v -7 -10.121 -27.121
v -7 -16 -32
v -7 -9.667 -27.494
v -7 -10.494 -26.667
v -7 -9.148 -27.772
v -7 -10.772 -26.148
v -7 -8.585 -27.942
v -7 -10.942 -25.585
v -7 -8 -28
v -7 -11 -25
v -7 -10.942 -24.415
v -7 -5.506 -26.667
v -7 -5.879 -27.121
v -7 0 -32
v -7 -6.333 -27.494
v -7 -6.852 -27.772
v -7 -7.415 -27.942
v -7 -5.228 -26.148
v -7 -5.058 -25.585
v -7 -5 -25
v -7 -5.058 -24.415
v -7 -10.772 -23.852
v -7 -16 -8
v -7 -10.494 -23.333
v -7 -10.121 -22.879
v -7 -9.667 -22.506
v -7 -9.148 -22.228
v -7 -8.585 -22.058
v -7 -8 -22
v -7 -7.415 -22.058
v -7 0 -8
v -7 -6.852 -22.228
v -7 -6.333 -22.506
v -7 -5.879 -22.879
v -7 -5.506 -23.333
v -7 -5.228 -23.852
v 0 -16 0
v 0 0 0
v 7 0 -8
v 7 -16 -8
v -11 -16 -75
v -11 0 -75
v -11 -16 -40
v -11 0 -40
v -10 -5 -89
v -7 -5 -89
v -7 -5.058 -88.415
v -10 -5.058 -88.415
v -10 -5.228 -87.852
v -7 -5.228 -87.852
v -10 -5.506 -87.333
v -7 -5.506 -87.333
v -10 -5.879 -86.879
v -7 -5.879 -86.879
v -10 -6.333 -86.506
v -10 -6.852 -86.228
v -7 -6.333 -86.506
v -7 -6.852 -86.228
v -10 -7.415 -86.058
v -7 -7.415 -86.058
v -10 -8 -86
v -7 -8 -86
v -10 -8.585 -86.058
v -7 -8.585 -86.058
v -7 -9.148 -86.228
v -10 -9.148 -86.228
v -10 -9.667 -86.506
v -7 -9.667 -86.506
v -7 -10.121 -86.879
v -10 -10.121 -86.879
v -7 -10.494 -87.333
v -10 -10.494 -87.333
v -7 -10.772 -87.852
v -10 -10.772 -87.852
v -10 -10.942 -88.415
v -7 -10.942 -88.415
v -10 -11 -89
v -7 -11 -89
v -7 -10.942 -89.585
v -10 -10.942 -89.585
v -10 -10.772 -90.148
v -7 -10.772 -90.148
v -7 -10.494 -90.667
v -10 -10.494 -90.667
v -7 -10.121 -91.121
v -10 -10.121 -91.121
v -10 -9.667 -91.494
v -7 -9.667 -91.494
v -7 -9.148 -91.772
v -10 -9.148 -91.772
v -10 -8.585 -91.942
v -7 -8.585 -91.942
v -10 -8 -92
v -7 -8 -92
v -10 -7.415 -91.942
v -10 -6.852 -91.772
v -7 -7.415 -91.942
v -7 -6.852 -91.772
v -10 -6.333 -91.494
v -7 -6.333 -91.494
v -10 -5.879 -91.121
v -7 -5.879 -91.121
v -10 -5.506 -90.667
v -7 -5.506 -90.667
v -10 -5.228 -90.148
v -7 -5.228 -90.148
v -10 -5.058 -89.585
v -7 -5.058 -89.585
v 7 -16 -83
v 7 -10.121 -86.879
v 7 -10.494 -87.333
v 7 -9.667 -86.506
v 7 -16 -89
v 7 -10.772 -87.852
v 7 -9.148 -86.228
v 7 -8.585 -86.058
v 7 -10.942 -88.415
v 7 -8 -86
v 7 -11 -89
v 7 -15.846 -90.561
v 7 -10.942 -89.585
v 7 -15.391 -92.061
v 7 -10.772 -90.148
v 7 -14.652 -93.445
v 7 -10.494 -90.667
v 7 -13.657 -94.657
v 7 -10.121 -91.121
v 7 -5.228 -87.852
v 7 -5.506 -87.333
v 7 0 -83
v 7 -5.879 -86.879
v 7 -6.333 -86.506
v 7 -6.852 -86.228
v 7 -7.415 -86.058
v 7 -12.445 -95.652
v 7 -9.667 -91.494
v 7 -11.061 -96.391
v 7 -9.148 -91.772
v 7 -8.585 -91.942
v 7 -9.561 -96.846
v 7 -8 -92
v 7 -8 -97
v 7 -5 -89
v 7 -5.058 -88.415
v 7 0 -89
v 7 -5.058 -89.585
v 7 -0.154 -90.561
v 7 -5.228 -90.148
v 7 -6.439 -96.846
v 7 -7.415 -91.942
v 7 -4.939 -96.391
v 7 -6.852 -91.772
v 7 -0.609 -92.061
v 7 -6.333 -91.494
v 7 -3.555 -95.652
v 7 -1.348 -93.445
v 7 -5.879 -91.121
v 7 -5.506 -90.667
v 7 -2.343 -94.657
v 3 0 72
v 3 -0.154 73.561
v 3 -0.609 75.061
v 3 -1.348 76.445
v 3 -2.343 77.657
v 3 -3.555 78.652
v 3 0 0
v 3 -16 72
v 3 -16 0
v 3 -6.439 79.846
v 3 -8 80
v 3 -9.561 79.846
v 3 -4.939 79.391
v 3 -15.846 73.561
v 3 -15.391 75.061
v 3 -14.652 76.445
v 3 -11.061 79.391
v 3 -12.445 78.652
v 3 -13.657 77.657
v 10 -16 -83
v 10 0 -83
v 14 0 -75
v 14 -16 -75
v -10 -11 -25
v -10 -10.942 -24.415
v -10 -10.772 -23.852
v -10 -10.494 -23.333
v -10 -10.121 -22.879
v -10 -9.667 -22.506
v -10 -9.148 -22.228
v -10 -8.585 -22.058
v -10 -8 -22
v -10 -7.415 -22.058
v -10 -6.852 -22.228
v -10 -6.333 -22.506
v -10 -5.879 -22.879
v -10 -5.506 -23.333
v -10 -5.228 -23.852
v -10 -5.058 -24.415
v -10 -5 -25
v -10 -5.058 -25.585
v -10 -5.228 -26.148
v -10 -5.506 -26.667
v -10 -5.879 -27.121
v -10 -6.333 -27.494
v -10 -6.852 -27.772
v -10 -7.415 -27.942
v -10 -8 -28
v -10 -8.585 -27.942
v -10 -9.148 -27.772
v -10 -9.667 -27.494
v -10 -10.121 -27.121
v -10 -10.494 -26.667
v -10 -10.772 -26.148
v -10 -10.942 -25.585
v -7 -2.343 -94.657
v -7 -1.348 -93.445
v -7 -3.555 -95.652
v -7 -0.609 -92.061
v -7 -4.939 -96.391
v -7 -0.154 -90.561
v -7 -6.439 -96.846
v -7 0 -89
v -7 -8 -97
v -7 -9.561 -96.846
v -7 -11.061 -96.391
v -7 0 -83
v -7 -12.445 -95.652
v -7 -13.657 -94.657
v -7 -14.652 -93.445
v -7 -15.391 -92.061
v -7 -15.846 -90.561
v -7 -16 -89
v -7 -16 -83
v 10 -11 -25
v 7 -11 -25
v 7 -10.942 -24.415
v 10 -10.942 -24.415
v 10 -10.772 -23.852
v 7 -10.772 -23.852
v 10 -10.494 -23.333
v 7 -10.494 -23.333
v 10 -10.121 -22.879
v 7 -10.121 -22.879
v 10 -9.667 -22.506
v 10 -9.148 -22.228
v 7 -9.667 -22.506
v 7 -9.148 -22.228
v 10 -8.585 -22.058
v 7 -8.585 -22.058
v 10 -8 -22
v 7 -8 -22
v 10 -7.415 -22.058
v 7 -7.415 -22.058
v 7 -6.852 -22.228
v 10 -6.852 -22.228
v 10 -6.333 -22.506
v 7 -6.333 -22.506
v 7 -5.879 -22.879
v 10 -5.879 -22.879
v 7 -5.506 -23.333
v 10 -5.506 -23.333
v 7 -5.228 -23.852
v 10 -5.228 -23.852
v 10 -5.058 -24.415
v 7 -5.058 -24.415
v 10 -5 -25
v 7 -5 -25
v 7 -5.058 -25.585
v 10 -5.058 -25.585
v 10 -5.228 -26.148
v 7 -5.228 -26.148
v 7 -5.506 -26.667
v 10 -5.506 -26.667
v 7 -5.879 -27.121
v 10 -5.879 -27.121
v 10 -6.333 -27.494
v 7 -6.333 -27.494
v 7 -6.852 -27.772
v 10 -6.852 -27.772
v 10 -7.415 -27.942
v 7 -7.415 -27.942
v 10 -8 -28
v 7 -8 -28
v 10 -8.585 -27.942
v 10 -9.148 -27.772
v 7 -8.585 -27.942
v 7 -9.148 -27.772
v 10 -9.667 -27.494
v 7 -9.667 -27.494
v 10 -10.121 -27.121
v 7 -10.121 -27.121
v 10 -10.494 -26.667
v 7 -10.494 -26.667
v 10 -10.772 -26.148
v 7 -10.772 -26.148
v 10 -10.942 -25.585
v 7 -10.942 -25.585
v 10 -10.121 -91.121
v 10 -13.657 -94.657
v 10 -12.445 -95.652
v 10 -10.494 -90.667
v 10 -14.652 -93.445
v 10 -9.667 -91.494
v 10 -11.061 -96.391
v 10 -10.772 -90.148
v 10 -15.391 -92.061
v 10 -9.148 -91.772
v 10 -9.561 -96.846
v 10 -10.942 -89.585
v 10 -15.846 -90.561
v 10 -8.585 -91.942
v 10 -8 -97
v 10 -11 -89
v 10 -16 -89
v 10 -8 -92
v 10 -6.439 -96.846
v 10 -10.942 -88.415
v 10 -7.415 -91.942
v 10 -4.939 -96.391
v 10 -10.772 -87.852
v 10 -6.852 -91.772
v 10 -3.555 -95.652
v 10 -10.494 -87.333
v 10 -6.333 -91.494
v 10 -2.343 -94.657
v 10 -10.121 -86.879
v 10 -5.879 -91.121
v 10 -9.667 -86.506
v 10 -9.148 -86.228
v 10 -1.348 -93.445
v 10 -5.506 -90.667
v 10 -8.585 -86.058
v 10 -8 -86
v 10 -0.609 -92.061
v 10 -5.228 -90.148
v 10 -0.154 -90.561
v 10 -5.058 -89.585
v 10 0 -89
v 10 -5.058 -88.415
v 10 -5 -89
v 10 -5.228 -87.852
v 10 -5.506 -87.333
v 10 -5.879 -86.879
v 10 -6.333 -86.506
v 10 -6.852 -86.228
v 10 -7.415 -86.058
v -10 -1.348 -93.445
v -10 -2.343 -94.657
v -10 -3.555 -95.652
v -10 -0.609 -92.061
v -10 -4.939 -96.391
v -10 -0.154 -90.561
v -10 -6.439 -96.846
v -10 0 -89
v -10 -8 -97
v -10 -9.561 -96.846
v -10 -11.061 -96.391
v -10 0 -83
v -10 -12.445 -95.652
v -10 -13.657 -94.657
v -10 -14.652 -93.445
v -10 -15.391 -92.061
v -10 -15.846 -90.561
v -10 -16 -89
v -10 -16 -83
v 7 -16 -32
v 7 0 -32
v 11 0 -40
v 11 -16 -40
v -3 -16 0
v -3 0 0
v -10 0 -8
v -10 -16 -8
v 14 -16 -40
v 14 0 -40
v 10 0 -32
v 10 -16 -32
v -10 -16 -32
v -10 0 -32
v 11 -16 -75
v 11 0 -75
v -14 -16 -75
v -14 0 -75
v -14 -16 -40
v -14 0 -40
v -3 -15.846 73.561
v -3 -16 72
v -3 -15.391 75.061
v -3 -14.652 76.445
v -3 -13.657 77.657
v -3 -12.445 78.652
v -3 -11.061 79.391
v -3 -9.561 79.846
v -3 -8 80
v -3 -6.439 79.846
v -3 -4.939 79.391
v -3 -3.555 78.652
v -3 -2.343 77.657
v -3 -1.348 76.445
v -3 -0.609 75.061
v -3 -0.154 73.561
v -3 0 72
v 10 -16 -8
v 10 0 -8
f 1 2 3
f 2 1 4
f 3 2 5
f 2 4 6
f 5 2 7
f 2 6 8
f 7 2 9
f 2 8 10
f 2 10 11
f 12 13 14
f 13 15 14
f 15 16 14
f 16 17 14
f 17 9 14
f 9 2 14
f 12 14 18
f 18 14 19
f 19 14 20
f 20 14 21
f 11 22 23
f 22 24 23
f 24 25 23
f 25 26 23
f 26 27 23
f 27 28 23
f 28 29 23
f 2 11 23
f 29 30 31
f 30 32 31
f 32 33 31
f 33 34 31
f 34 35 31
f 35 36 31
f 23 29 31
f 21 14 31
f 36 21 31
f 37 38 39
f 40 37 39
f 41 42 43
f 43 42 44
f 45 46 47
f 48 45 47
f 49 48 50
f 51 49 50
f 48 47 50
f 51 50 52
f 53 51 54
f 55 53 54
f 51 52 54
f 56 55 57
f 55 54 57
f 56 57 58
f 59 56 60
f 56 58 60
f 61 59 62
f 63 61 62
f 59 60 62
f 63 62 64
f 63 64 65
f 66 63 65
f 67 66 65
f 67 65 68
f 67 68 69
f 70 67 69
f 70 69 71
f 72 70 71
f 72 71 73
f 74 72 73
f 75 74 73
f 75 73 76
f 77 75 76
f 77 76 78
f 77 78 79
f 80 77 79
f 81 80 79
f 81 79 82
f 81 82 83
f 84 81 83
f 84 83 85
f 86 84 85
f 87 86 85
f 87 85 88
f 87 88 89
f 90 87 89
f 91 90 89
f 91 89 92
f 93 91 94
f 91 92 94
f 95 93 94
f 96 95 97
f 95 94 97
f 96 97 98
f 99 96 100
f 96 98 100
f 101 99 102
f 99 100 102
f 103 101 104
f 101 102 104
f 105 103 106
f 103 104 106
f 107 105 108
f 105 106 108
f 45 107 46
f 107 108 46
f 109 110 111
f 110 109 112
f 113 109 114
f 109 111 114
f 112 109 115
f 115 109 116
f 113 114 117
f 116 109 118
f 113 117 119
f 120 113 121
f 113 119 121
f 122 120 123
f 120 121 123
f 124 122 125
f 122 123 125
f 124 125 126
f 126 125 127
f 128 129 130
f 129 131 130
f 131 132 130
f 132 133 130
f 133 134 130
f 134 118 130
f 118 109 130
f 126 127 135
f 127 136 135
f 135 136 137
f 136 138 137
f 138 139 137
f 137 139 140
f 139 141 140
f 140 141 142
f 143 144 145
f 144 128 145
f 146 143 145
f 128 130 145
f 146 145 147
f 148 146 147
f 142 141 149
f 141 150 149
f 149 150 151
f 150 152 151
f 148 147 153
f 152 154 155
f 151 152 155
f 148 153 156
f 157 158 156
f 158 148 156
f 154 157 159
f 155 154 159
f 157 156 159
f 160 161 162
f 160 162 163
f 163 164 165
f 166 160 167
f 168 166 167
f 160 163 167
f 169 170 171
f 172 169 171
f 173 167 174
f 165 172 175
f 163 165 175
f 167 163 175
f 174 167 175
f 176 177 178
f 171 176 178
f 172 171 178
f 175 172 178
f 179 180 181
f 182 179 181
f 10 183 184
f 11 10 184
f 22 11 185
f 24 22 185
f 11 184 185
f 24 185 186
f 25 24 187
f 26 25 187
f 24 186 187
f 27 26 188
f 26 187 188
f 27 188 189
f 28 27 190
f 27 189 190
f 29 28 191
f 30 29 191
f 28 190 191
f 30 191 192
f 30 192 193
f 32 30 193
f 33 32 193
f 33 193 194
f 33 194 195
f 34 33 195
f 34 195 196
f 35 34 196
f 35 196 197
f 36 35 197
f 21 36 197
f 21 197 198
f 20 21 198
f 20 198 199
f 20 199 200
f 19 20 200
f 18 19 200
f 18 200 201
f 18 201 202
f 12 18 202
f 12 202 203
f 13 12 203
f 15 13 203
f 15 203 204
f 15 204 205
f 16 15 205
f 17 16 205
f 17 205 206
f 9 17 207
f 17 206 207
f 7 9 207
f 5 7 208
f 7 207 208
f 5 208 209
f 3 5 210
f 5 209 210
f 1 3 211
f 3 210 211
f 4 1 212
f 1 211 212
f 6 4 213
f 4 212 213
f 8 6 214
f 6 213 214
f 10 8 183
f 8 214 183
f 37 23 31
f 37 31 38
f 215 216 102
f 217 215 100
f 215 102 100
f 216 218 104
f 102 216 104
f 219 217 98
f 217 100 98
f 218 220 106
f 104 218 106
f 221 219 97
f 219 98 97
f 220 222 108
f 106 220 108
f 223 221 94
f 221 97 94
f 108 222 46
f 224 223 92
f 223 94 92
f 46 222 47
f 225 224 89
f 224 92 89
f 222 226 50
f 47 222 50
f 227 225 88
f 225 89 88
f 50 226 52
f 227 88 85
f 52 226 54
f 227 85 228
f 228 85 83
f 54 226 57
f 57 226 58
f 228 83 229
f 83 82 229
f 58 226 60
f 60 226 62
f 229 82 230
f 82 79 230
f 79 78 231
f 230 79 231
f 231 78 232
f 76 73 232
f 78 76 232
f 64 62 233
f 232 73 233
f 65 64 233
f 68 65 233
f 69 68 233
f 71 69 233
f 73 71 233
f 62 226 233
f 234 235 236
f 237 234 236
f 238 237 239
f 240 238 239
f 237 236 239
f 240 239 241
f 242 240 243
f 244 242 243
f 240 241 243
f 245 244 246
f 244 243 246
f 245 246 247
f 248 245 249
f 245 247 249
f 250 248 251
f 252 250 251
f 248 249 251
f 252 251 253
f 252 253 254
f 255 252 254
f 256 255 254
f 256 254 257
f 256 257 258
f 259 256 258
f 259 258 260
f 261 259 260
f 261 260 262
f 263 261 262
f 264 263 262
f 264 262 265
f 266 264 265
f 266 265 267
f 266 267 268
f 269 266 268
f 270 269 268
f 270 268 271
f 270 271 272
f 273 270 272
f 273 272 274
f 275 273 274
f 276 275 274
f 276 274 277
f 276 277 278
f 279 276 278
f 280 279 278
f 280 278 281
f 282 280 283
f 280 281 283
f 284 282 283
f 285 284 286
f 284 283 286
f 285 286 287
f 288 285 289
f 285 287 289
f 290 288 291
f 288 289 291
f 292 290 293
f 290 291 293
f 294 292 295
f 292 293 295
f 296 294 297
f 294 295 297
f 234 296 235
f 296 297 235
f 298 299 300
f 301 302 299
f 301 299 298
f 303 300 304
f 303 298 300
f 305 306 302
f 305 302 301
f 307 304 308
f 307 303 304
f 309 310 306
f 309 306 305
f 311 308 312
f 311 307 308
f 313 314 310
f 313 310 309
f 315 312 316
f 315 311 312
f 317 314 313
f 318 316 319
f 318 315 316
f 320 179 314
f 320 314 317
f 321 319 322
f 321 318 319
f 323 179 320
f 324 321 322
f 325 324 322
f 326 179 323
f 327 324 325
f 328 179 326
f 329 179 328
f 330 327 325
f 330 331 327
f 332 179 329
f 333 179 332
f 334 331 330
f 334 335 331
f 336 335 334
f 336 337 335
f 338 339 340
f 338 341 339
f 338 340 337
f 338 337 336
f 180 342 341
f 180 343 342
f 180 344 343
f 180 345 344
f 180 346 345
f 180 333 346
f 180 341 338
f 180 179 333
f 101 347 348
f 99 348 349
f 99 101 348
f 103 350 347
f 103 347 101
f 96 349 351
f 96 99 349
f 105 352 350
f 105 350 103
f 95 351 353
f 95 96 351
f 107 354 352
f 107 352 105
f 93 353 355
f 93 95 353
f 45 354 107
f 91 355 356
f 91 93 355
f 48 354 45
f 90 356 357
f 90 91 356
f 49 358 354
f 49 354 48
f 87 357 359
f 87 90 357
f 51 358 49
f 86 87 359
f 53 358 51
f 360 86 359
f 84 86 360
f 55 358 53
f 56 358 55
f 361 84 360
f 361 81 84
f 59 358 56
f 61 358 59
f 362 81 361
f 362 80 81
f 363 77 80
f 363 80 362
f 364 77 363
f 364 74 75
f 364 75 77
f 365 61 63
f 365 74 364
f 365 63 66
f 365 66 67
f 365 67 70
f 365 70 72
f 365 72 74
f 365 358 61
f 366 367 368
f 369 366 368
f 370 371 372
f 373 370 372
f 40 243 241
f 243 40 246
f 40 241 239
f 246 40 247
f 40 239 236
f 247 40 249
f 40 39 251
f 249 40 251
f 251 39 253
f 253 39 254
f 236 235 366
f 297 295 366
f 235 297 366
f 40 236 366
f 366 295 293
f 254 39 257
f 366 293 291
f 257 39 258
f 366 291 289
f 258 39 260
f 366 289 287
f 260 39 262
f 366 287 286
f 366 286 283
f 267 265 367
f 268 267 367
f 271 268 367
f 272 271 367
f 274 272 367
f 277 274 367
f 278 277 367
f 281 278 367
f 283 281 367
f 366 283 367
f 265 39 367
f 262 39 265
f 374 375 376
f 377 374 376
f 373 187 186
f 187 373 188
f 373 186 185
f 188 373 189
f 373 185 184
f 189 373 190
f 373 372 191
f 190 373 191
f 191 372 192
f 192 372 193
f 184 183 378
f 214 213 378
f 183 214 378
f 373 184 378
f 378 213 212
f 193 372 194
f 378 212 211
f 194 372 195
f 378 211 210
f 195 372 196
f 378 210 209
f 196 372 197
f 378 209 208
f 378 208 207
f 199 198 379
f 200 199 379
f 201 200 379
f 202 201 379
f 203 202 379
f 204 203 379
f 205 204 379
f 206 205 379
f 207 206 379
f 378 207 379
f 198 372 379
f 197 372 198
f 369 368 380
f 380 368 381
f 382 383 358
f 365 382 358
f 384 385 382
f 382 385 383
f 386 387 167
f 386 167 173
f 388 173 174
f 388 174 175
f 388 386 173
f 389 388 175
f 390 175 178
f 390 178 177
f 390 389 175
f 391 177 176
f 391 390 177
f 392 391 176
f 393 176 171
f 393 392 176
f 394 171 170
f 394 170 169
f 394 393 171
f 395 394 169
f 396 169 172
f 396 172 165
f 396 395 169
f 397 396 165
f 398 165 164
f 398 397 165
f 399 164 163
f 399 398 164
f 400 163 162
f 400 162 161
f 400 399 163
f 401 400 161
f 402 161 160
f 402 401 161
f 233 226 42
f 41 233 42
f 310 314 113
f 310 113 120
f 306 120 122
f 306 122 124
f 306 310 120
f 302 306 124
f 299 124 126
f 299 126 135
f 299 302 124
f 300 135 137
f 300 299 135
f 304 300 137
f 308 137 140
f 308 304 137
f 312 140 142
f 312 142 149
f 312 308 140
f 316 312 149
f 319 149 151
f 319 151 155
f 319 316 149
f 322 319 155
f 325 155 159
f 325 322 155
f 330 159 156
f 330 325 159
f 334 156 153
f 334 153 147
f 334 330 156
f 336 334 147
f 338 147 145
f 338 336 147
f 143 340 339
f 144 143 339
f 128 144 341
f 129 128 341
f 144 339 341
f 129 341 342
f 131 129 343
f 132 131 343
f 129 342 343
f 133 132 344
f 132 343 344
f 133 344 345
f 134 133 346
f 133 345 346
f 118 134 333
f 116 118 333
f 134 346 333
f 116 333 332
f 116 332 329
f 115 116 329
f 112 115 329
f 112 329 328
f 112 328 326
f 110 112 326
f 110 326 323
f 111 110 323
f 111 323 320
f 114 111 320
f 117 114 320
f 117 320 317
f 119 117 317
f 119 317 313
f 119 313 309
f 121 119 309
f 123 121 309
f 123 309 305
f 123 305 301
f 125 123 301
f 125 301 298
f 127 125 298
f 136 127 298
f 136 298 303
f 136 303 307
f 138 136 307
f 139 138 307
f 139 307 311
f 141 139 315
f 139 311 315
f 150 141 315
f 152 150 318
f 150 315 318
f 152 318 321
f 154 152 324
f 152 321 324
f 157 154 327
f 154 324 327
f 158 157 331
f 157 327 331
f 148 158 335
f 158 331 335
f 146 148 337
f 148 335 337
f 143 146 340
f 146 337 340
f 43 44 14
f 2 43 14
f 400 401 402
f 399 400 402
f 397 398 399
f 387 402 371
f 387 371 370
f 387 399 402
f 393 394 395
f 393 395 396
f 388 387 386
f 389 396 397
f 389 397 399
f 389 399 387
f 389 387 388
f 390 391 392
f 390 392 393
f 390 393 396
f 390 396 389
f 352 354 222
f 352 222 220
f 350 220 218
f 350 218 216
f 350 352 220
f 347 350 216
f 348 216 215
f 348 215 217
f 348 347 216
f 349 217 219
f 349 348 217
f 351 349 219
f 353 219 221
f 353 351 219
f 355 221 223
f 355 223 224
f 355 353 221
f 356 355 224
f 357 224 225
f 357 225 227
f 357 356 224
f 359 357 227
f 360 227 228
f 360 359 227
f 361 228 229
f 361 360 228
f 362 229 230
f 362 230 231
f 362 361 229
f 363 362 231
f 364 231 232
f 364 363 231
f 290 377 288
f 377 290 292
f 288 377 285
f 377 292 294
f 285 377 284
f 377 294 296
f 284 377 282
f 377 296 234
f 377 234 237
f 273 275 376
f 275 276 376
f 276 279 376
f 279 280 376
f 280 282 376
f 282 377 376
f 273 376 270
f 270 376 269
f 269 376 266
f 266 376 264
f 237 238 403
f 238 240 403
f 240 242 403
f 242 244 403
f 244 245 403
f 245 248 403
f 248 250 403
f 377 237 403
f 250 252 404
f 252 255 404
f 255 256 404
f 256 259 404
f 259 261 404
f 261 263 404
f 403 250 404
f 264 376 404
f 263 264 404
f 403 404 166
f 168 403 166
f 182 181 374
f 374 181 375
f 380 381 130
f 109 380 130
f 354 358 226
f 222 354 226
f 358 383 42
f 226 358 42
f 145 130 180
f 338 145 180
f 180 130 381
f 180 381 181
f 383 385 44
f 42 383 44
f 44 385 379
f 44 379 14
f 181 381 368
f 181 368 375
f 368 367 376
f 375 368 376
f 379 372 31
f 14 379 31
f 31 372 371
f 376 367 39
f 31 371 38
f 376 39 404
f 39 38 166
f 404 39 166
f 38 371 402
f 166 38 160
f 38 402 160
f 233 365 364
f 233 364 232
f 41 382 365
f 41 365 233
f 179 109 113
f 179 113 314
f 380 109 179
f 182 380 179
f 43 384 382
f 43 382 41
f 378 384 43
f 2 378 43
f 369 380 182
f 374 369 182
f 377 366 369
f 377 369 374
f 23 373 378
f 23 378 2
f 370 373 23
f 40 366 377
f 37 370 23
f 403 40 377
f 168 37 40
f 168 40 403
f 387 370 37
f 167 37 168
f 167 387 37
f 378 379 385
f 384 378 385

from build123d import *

# Parameters (mm, degrees)
F1_DEPTH  = 16
F2_R      = 3
F3_DEPTH  = 20
F5_DEPTH  = 6
F7_DEPTH  = 3
F8_R      = 3
F9_DEPTH  = 3
F10_DEPTH = 20


with BuildPart() as f1:
    # F0 (on Front) → F1 (new body)
    with BuildSketch(Plane.XZ):
        Polygon((3, 72), (-3, 72), (-3, 0), (0, 0), (3, 0), align=None)
        Polygon((0, 0), (-3, 0), (-10, -8), (-10, -32), (-14, -40), (-14, -75), (-10, -83), (-10, -89), (-7, -89), (-7, -83), (-11, -75), (-11, -40), (-7, -32), (-7, -8), align=None)
        Polygon((10, -8), (3, 0), (0, 0), (7, -8), (7, -32), (11, -40), (11, -75), (7, -83), (7, -89), (10, -89), (10, -83), (14, -75), (14, -40), (10, -32), align=None)
    extrude(amount=F1_DEPTH)

    # F2 (on face) → F3 (cut)
    with BuildSketch(Plane(origin=(-10, 0, 0), x_dir=(0, -1, 0), z_dir=(-1, 0, 0))):
        with Locations((8, -25)):
            Circle(F2_R)
    extrude(amount=-F3_DEPTH, mode=Mode.SUBTRACT)

    # F4 (on face) → F5 (join)
    with BuildSketch(Plane(origin=(-3, 0, 0), x_dir=(0, -1, 0), z_dir=(-1, 0, 0))):
        with BuildLine():
            Line((0, 72), (16, 72))
            ThreePointArc((16, 72), (8, 80), (0, 72))
        make_face()
    extrude(amount=-F5_DEPTH)

    # F6 (on face) → F7 (join)
    with BuildSketch(Plane(origin=(-10, 0, 0), x_dir=(0, -1, 0), z_dir=(-1, 0, 0))):
        with BuildLine():
            Line((16, -89), (0, -89))
            ThreePointArc((0, -89), (8, -97), (16, -89))
        make_face()
    extrude(amount=-F7_DEPTH)

    # F8 (on face) → F9 (join)
    with BuildSketch(Plane.YZ.offset(10)):
        with Locations((-8, -89)):
            Circle(F8_R)
        with BuildLine():
            Line((-11, -89), (-16, -89))
            ThreePointArc((-16, -89), (-8, -97), (0, -89))
            Line((0, -89), (-5, -89))
            ThreePointArc((-5, -89), (-8, -92), (-11, -89))
        make_face()
    extrude(amount=-F9_DEPTH)

    # F8 (on face) → F10 (cut)
    with BuildSketch(Plane.YZ.offset(10)):
        with Locations((-8, -89)):
            Circle(F8_R)
    extrude(amount=-F10_DEPTH, mode=Mode.SUBTRACT)


solid = f1.part
